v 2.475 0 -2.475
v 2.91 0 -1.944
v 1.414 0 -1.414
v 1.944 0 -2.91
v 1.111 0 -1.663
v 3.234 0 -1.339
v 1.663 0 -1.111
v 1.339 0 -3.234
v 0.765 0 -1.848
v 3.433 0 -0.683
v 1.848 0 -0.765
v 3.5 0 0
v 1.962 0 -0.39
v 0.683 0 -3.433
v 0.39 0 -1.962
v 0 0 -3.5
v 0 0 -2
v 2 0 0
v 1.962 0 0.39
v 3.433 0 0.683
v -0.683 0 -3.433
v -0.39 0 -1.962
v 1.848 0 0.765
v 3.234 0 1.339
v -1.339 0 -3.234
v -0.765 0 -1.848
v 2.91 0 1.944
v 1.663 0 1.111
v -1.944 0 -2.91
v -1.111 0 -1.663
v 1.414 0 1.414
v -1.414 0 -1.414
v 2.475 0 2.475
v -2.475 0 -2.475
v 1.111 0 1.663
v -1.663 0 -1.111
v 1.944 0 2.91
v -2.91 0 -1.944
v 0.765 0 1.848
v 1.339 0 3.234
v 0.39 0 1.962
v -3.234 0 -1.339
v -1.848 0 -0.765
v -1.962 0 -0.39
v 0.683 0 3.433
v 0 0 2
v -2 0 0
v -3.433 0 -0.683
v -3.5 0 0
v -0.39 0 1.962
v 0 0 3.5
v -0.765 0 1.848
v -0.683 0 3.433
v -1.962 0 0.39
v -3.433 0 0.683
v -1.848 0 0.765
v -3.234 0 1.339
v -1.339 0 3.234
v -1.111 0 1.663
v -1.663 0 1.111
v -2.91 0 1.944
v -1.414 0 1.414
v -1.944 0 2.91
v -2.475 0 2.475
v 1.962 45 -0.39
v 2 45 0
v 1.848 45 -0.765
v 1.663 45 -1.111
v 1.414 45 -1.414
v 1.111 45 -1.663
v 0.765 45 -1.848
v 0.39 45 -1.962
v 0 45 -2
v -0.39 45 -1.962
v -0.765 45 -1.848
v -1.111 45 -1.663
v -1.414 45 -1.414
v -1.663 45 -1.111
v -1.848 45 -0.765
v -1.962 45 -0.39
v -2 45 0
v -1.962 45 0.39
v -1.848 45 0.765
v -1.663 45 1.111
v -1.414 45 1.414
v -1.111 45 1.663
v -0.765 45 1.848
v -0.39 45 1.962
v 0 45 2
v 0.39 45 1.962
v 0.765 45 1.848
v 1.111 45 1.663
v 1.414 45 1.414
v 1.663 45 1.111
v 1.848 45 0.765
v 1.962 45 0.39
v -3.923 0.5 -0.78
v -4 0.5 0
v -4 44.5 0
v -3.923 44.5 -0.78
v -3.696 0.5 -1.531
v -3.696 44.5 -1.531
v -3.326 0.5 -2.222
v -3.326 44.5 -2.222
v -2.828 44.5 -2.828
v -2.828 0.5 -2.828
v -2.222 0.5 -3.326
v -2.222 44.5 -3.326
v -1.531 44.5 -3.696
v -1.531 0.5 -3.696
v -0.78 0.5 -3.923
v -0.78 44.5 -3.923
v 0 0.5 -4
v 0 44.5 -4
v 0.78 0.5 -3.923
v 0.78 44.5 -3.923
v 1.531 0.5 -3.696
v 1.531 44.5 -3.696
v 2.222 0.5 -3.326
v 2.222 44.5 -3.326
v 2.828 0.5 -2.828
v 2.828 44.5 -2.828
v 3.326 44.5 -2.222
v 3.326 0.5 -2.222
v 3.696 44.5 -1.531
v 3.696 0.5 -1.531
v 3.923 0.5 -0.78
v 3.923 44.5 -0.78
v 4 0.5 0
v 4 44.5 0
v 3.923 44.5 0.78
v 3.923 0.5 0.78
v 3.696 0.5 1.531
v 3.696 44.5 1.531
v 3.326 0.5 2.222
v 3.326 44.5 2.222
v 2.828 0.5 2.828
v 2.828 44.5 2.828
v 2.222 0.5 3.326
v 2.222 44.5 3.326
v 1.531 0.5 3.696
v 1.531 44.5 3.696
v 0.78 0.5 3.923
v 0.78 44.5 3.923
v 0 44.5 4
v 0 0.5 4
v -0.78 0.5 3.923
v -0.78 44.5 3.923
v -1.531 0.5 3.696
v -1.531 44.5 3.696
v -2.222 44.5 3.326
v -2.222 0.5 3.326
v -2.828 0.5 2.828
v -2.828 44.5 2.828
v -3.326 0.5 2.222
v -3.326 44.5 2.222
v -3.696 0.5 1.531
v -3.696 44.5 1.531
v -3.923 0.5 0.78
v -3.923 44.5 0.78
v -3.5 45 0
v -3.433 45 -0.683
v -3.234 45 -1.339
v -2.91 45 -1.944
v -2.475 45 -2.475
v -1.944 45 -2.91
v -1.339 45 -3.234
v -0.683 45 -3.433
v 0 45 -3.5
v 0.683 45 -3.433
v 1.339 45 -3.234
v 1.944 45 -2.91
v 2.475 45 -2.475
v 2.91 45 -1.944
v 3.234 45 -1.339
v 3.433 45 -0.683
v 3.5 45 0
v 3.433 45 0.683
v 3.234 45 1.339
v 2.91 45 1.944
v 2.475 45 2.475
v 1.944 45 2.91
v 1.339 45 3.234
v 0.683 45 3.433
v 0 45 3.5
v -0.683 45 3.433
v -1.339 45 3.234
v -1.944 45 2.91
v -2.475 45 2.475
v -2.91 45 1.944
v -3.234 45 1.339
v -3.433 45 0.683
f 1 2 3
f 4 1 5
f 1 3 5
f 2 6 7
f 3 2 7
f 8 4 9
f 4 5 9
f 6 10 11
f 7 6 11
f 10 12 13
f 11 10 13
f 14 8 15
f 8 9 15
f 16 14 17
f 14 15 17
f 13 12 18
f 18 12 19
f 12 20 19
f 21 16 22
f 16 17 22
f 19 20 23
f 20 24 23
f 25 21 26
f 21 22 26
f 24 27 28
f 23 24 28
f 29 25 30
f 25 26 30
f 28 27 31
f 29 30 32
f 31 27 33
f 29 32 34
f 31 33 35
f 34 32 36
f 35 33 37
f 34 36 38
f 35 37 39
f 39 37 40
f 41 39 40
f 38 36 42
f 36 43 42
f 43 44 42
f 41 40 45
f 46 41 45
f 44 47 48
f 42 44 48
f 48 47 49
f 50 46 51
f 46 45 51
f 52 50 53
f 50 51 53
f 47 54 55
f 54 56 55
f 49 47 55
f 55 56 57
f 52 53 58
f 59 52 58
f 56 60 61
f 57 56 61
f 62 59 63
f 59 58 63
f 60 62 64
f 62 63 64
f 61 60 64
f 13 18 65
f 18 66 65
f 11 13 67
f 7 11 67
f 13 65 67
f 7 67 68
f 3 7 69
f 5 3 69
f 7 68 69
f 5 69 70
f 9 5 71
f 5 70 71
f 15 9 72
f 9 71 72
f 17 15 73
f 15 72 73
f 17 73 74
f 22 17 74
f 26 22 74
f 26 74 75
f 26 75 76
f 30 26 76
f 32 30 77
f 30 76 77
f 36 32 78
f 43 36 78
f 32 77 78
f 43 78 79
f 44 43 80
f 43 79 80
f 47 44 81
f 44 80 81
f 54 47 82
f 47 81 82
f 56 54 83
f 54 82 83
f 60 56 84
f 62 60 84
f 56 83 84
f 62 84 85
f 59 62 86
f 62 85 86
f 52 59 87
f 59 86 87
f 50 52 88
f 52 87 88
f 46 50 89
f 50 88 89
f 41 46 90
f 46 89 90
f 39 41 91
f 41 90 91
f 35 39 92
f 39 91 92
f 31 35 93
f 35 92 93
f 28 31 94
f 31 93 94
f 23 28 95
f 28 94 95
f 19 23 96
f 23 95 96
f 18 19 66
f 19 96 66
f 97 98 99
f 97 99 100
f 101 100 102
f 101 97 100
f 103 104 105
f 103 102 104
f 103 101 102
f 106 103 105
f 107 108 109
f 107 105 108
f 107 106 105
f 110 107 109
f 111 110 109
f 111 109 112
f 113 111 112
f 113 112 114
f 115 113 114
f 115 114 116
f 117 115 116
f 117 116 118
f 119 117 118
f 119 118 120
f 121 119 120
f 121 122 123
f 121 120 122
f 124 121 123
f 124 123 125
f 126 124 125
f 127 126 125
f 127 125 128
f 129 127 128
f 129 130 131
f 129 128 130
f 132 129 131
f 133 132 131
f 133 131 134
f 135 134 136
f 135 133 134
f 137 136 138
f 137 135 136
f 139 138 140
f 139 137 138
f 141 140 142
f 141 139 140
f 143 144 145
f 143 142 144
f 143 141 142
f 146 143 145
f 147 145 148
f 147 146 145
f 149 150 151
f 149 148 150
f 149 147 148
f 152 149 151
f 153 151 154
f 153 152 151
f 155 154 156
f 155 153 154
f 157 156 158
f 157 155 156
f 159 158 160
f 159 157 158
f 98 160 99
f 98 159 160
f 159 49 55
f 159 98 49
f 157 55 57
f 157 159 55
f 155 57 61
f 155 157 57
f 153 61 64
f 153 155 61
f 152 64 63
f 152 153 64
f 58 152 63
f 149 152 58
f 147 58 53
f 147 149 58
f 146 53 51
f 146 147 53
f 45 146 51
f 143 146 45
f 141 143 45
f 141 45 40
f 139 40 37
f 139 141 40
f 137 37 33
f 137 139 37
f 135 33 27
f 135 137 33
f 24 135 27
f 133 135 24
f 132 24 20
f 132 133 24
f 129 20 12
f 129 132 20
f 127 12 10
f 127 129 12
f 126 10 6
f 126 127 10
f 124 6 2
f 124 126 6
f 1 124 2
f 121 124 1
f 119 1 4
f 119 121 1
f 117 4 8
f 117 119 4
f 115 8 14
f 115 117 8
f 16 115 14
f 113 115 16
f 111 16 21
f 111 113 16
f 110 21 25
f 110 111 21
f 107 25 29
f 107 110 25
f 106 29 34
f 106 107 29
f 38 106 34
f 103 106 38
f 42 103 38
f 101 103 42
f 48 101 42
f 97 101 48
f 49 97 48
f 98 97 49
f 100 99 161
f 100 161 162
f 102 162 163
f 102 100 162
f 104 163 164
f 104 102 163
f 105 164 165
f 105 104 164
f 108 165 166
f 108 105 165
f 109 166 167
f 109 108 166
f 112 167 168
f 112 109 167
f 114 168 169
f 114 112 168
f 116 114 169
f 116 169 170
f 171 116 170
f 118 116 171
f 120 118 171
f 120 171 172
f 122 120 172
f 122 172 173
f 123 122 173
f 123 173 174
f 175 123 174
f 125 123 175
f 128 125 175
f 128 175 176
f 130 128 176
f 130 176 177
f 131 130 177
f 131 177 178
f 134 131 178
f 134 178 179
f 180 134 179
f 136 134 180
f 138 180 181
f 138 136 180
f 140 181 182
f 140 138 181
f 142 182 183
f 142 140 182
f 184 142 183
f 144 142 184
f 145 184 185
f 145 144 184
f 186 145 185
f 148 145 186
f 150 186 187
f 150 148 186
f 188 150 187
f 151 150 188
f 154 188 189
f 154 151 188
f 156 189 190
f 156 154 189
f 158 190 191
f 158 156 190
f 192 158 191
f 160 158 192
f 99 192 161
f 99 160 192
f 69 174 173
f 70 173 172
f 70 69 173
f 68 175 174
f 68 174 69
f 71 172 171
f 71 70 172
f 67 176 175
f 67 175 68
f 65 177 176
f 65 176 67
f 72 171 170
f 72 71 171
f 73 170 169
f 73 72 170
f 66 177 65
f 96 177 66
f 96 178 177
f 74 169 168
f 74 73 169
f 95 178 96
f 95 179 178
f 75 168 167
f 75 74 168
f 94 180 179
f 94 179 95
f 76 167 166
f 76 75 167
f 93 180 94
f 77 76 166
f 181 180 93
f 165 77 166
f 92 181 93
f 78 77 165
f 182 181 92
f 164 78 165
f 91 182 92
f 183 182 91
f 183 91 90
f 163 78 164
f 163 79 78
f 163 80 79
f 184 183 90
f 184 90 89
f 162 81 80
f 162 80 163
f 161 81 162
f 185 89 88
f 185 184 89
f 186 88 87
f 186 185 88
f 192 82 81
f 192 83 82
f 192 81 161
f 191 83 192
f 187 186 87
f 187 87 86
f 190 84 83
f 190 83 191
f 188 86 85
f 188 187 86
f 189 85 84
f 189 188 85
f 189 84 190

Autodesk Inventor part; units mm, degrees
ref_plane "YZ Plane" through (0, 0, 0) normal (1, 0, 0) x (0, 1, 0)
ref_plane "XZ Plane" through (0, 0, 0) normal (0, 1, 0) x (-1, 0, 0)
ref_plane "XY Plane" through (0, 0, 0) normal (0, 0, 1) x (1, 0, 0)
sketch "Sketch1" plane through (0, 0, 0) normal (0, 1, 0) x (-1, 0, 0)
  circle A0 centre (0, 0) radius 4
  dimension "d0" = 8
extrude "Extrusion1" add sketch "Sketch1" along normal blind 45
chamfer "Chamfer1" distance 0.5 angle 45 2 edges at (4, 45, 0) (4, 0, 0)
sketch "Sketch2" plane through (0, 45, 0) normal (0, 1, 0) x (1, 0, 0)
  circle A0 centre (0, 0) radius 2
  dimension "d6" = 4
extrude "Extrusion2" cut sketch "Sketch2" against normal blind 45
properties part number "pin_8_45"
